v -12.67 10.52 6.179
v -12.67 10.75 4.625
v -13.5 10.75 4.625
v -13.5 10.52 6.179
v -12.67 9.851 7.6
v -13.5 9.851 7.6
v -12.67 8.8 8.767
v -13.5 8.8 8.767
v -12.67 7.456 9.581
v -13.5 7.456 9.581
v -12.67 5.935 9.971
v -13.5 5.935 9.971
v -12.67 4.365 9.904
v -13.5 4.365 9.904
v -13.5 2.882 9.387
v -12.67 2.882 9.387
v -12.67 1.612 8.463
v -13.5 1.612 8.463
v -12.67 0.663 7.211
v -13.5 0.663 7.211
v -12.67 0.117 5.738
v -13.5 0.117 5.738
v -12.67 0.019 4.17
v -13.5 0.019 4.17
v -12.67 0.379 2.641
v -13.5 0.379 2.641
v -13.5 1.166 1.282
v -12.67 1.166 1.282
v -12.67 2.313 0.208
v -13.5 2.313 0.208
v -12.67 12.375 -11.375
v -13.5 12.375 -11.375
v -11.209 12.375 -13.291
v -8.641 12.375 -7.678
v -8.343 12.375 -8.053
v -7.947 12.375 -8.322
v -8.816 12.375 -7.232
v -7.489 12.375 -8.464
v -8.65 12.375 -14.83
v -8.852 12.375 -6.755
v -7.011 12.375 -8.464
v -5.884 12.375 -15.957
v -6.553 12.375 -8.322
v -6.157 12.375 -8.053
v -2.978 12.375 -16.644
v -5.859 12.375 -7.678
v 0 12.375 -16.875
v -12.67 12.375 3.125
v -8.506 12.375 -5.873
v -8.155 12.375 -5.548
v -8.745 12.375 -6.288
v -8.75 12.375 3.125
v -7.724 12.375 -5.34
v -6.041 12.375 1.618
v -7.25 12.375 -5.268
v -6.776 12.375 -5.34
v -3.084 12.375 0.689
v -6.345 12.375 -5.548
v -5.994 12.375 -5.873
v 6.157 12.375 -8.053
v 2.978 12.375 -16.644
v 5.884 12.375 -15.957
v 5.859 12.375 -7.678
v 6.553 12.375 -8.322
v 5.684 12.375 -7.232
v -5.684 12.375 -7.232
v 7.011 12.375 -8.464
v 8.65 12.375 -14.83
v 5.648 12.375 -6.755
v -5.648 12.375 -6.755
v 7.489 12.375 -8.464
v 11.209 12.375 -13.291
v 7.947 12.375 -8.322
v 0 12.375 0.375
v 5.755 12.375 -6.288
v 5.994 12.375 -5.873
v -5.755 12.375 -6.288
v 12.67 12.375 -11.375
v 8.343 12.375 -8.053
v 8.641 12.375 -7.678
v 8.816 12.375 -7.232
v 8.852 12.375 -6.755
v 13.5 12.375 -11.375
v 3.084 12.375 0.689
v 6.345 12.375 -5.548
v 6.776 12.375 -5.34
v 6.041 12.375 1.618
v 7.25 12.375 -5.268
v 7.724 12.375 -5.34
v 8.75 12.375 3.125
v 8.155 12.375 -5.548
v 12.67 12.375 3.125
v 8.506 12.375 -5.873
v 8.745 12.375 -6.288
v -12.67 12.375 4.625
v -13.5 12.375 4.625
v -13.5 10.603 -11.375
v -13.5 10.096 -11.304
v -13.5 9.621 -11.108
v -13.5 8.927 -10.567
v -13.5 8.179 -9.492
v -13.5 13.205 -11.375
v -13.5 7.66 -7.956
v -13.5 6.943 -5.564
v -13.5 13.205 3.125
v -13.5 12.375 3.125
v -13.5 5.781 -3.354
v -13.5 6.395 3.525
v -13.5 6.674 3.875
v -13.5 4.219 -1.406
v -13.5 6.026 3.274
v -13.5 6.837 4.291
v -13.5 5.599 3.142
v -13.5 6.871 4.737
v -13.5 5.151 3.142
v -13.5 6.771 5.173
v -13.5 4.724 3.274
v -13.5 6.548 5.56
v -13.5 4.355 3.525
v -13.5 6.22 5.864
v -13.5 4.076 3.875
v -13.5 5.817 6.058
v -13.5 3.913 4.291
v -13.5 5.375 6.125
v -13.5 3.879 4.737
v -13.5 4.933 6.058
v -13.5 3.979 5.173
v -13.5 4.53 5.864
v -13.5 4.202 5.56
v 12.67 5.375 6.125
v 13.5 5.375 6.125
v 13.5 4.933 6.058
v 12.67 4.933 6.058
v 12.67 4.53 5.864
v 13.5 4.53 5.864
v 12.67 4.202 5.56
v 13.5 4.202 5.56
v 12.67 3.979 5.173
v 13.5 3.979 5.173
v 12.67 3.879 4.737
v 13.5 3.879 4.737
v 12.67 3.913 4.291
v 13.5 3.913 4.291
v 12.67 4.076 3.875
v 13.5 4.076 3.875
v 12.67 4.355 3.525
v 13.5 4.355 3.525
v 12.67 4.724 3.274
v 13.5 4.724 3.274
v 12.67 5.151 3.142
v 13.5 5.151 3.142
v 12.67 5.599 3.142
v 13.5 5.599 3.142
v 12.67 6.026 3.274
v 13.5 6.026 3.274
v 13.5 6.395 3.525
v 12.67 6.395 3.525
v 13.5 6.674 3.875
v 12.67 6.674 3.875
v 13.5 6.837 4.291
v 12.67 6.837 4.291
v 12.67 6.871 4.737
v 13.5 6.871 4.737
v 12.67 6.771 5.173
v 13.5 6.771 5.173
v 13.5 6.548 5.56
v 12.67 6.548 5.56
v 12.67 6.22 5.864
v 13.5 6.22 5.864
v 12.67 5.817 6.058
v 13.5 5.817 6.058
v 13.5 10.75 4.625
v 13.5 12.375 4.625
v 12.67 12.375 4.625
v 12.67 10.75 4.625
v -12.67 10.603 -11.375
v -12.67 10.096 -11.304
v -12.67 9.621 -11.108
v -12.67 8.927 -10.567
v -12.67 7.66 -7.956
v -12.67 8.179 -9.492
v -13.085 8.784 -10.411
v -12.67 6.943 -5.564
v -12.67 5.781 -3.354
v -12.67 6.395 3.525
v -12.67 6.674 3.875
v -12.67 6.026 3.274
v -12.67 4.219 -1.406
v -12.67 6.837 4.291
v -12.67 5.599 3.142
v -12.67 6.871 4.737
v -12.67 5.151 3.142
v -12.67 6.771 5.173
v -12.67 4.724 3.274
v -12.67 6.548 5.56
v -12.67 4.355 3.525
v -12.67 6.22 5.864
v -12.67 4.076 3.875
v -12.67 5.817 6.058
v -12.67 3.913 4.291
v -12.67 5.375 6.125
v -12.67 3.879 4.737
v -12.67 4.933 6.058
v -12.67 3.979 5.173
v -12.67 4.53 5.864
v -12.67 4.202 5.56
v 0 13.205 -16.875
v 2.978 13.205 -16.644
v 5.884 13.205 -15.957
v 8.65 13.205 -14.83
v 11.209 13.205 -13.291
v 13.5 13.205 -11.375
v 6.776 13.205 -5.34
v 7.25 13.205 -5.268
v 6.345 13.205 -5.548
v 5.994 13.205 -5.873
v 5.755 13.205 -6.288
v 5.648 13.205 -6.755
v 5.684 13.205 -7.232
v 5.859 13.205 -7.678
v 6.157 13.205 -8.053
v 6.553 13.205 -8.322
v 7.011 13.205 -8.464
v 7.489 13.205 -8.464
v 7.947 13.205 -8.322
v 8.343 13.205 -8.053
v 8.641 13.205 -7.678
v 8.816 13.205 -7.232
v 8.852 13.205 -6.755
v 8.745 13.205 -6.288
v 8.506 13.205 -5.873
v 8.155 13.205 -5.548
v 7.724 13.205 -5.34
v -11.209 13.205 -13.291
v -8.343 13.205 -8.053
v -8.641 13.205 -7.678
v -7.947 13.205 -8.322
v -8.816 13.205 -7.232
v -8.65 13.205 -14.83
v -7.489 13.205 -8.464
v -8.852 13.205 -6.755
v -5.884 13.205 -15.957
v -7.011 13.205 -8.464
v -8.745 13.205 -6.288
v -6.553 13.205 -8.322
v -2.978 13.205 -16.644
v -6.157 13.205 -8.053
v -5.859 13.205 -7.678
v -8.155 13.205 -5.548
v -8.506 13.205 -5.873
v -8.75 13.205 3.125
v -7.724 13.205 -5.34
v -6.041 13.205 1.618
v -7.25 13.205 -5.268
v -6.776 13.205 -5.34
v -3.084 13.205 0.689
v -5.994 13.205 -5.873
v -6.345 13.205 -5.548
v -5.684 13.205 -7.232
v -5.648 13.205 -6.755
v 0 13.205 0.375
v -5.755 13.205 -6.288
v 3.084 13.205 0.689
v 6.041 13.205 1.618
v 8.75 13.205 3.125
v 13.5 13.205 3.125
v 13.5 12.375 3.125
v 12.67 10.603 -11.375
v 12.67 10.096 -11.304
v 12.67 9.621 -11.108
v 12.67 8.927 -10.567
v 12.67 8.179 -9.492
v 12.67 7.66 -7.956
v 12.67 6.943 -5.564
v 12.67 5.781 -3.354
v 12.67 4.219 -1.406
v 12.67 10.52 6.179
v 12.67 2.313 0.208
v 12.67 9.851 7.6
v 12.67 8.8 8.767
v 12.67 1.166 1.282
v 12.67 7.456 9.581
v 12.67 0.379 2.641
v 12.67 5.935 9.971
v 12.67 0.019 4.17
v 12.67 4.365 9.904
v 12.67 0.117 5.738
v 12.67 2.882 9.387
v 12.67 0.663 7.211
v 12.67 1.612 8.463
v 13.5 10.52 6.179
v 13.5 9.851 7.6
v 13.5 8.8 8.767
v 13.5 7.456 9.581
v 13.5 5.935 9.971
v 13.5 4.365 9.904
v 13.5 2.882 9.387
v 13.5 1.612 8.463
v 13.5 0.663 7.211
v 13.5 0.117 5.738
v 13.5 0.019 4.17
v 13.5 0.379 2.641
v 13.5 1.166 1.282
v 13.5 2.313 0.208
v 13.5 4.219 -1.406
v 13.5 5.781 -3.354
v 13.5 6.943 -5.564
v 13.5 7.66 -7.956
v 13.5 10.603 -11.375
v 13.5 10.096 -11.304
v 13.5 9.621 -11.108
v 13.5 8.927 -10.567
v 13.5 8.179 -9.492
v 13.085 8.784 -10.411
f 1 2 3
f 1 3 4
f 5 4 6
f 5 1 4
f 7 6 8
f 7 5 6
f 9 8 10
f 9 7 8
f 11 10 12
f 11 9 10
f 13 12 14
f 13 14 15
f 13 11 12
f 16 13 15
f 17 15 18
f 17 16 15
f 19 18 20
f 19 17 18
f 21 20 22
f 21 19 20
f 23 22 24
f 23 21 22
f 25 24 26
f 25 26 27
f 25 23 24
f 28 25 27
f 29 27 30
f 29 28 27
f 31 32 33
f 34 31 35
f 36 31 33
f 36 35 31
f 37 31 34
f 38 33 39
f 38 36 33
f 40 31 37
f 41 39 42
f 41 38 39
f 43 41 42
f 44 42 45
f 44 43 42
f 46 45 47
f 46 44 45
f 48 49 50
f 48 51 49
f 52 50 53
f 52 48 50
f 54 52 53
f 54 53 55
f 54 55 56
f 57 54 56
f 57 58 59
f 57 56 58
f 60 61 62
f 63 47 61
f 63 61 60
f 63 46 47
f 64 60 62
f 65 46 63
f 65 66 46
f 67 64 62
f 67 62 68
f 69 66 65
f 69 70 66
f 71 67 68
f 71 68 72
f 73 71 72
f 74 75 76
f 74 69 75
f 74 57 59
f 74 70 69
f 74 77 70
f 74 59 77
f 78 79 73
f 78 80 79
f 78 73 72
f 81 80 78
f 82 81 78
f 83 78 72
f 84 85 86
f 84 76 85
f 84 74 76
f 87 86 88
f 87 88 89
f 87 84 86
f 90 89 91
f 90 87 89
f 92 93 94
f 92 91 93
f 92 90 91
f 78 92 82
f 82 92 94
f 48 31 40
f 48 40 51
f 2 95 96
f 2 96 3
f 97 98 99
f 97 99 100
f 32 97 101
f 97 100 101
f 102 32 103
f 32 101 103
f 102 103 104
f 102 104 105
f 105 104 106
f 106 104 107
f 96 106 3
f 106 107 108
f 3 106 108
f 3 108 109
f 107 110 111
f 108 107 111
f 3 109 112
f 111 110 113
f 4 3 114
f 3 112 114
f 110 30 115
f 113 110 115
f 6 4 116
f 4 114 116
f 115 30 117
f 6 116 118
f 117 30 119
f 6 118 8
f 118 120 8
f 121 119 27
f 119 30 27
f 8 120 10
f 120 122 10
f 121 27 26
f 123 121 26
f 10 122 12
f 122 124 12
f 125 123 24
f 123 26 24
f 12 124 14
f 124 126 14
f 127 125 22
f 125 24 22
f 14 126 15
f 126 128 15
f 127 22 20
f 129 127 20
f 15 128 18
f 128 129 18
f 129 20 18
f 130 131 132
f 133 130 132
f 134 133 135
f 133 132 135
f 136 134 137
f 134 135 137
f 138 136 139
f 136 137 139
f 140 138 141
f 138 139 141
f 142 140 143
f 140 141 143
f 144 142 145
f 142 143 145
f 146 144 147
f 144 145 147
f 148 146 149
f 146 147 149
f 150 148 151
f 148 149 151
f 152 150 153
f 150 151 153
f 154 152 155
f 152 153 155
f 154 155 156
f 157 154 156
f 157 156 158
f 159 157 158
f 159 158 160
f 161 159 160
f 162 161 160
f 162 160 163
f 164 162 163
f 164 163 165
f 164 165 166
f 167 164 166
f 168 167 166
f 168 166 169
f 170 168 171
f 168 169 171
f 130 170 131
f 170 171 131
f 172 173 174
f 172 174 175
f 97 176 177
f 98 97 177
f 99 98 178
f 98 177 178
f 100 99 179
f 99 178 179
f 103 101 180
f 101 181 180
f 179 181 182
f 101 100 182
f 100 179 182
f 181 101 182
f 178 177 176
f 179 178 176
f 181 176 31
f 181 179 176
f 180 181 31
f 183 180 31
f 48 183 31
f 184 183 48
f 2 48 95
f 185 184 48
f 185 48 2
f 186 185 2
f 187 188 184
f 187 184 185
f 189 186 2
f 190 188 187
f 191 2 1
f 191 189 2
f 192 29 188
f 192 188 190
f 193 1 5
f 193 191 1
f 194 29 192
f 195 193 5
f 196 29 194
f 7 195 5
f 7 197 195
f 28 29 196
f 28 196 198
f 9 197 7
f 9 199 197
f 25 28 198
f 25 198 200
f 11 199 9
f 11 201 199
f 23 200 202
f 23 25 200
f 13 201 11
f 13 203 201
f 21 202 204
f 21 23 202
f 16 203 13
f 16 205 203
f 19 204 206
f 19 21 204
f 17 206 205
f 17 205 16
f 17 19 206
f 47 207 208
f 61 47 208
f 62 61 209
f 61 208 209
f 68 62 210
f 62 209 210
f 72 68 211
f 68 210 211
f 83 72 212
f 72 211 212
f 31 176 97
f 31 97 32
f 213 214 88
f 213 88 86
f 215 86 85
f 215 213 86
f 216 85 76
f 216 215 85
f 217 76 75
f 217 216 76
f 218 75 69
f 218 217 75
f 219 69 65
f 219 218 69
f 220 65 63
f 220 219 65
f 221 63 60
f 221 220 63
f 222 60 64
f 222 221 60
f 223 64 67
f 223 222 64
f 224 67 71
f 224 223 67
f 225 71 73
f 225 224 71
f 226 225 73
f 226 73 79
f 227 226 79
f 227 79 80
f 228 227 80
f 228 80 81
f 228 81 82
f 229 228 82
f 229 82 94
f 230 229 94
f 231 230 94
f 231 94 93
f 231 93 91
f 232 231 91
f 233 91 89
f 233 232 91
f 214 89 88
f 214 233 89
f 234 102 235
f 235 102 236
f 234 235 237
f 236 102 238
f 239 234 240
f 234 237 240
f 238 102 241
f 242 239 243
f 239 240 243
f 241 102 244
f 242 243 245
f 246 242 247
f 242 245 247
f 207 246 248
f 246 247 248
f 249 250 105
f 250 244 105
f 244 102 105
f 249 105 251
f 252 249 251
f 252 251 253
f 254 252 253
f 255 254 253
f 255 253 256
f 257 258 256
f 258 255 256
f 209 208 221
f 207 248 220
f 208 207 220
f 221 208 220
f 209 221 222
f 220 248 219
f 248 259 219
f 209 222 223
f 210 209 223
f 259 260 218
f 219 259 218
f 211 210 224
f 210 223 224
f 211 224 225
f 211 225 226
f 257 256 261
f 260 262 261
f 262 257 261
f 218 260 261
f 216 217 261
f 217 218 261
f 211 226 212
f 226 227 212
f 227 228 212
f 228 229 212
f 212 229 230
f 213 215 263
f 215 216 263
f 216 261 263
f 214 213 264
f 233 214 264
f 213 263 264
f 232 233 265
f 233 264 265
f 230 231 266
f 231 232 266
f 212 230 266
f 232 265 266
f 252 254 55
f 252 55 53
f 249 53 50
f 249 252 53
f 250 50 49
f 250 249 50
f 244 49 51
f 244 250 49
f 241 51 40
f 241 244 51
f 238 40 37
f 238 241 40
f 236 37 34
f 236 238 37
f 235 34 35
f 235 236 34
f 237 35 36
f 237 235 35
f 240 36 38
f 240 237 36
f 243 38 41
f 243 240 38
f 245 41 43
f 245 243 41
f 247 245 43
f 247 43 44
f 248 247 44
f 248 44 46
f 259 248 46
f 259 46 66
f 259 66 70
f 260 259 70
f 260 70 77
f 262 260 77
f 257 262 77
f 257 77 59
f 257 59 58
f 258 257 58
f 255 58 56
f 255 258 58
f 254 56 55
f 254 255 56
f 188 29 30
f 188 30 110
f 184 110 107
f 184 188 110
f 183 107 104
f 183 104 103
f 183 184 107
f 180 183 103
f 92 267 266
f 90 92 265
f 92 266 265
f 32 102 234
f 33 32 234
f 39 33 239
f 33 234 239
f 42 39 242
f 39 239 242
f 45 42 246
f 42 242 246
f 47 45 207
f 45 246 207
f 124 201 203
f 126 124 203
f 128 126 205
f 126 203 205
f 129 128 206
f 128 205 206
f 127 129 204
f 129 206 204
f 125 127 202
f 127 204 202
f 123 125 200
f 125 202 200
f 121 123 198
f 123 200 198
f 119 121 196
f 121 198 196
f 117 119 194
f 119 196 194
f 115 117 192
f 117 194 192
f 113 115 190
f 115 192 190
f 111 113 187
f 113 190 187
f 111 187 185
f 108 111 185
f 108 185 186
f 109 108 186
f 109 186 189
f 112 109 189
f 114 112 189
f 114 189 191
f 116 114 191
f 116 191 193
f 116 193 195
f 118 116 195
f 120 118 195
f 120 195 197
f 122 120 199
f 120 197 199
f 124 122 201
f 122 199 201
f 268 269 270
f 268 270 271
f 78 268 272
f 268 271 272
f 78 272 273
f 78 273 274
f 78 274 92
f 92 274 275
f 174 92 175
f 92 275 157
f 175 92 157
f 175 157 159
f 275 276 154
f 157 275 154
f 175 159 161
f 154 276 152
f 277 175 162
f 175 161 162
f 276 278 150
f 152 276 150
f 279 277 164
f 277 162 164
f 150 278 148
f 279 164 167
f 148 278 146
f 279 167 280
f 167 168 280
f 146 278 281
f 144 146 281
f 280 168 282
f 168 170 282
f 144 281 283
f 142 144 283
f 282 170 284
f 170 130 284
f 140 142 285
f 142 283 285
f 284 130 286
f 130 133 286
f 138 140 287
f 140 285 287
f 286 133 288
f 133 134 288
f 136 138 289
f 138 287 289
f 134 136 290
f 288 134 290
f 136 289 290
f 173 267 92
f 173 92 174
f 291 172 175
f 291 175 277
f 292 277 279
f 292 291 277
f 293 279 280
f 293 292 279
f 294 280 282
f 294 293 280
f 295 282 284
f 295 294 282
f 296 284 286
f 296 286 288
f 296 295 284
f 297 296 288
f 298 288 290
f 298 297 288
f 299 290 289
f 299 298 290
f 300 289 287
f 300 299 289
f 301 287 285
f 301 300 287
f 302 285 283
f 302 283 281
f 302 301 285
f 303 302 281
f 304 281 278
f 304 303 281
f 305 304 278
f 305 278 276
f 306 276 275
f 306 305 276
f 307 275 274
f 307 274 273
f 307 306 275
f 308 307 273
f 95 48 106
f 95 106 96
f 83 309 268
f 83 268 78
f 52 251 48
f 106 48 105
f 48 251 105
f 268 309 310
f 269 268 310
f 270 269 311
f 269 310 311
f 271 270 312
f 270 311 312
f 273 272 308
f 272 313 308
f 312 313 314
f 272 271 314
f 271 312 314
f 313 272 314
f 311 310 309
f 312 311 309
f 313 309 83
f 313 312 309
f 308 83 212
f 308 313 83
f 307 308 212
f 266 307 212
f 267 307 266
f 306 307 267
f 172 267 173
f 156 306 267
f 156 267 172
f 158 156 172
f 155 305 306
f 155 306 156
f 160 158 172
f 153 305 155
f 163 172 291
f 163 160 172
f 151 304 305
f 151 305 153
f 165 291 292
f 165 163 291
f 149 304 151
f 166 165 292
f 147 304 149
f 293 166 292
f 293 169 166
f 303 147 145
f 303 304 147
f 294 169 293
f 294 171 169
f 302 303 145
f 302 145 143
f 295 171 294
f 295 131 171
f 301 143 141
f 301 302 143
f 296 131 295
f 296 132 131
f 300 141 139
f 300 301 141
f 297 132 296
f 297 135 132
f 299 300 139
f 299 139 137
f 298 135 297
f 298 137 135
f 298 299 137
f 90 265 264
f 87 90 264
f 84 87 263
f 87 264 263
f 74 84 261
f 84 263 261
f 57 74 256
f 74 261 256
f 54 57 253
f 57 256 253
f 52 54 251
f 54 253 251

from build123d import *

# Parameters (mm, degrees)
SKETCH1_R             = 1.60655
BOSS_EXTRUDE1_DEPTH   = 0.83
BOSS_EXTRUDE4_START   = 13.5
SKETCH3_R             = 1.5
BOSS_EXTRUDE4_DEPTH   = 0.83
BOSS_EXTRUDE5_START   = -12.67
SKETCH3_5_R           = 1.5
BOSS_EXTRUDE5_DEPTH   = 0.83
BODY_MOVE_COPY1_ANGLE = 180


with BuildPart() as part:
    # Sketch1 → Boss-Extrude1 (new body)
    with BuildSketch(Plane(origin=(0, 0, 0), x_dir=(1, 0, 0), z_dir=(0, 1, 0))):
        with BuildLine():
            Line((13.5, -4.5), (13.5, 10))
            Line((13.5, 10), (8.75, 10))
            ThreePointArc((8.75, 10), (0, 7.25), (-8.75, 10))
            Line((-8.75, 10), (-13.5, 10))
            Line((-13.5, 10), (-13.5, -4.5))
            ThreePointArc((-13.5, -4.5), (-7.288689869, -8.572238768), (0, -10))
            ThreePointArc((0, -10), (7.288689869, -8.572238768), (13.5, -4.5))
        make_face()
        with Locations(Location((-7.25, 0, 0), (0, 0, 90))):
            Circle(SKETCH1_R, mode=Mode.SUBTRACT)
        with Locations(Location((7.25, 0, 0), (0, 0, 90))):
            Circle(SKETCH1_R, mode=Mode.SUBTRACT)
    extrude(amount=BOSS_EXTRUDE1_DEPTH)

    # Sketch3 → Boss-Extrude4 (add)
    with BuildSketch(Plane(origin=(0, 0, 0), x_dir=(0, 0, -1), z_dir=(1, 0, 0)).offset(BOSS_EXTRUDE4_START)):
        with BuildLine():
            Line((-4.5, 0.83), (10, 0.83))
            Line((10, 0.83), (11.5, 0.83))
            Line((11.5, 0.83), (11.5, 2.455))
            ThreePointArc((11.5, 2.455), (16.261860542, 10.323052182), (7.082672814, 10.892326816))
            ThreePointArc((7.082672814, 10.892326816), (2.026582548, 6.580128686), (-4.5, 5.33))
            Line((-4.5, 5.33), (-4.5, 0.83))
        make_face()
        with Locations((11.5, 7.83)):
            Circle(SKETCH3_R, mode=Mode.SUBTRACT)
    extrude(amount=-BOSS_EXTRUDE4_DEPTH)

    # Sketch3<5> → Boss-Extrude5 (add)
    with BuildSketch(Plane(origin=(0, 0, 0), x_dir=(0, 0, -1), z_dir=(1, 0, 0)).offset(BOSS_EXTRUDE5_START)):
        with BuildLine():
            Line((-4.5, 0.83), (10, 0.83))
            Line((10, 0.83), (11.5, 0.83))
            Line((11.5, 0.83), (11.5, 2.455))
            ThreePointArc((11.5, 2.455), (16.261860542, 10.323052182), (7.082672814, 10.892326816))
            ThreePointArc((7.082672814, 10.892326816), (2.026582548, 6.580128686), (-4.5, 5.33))
            Line((-4.5, 5.33), (-4.5, 0.83))
        make_face()
        with Locations((11.5, 7.83)):
            Circle(SKETCH3_5_R, mode=Mode.SUBTRACT)
    extrude(amount=-BOSS_EXTRUDE5_DEPTH)

    # Fillet4
    # an asymmetric fillet: 4, 3 mm, written as the material it takes off along each edge
    with BuildSketch(Plane(origin=(-4.106690229, 5.33, 4.5), x_dir=(0, -1, 0), z_dir=(-1, 0, 0))) as fillet4_piece_1:
        with BuildLine():
            Bezier((2.727713921, 0), (0.459985745, 0), (-0.21539832, -3.418544638), weights=[1, 0.772599008, 1])
            ThreePointArc((-0.21539832, -3.418544638), (0.005386199, -1.716397689), (0, 0))
            Line((0, 0), (2.727713921, 0))
        make_face()
    extrude(amount=17.956619542, mode=Mode.SUBTRACT)

    # Fillet5
    # an asymmetric fillet: 4, 3 mm, written as the material it takes off along each edge
    with BuildSketch(Plane(origin=(22.063309771, 5.33, 4.5), x_dir=(0, -1, 0), z_dir=(-1, 0, 0))) as fillet5_piece_1:
        with BuildLine():
            Bezier((2.727713921, 0), (0.459985745, 0), (-0.21539832, -3.418544638), weights=[1, 0.772599008, 1])
            ThreePointArc((-0.21539832, -3.418544638), (0.005386199, -1.716397689), (0, 0))
            Line((0, 0), (2.727713921, 0))
        make_face()
    extrude(amount=17.956619542, mode=Mode.SUBTRACT)


with BuildPart() as part_1:
    # Body-Move/Copy1: moved
    add(part.part.moved(Location((0, 0, 0))).rotate(Axis((0, 6.6025, -3.4375), (1, 0, 0)), BODY_MOVE_COPY1_ANGLE))


solid = part_1.part
